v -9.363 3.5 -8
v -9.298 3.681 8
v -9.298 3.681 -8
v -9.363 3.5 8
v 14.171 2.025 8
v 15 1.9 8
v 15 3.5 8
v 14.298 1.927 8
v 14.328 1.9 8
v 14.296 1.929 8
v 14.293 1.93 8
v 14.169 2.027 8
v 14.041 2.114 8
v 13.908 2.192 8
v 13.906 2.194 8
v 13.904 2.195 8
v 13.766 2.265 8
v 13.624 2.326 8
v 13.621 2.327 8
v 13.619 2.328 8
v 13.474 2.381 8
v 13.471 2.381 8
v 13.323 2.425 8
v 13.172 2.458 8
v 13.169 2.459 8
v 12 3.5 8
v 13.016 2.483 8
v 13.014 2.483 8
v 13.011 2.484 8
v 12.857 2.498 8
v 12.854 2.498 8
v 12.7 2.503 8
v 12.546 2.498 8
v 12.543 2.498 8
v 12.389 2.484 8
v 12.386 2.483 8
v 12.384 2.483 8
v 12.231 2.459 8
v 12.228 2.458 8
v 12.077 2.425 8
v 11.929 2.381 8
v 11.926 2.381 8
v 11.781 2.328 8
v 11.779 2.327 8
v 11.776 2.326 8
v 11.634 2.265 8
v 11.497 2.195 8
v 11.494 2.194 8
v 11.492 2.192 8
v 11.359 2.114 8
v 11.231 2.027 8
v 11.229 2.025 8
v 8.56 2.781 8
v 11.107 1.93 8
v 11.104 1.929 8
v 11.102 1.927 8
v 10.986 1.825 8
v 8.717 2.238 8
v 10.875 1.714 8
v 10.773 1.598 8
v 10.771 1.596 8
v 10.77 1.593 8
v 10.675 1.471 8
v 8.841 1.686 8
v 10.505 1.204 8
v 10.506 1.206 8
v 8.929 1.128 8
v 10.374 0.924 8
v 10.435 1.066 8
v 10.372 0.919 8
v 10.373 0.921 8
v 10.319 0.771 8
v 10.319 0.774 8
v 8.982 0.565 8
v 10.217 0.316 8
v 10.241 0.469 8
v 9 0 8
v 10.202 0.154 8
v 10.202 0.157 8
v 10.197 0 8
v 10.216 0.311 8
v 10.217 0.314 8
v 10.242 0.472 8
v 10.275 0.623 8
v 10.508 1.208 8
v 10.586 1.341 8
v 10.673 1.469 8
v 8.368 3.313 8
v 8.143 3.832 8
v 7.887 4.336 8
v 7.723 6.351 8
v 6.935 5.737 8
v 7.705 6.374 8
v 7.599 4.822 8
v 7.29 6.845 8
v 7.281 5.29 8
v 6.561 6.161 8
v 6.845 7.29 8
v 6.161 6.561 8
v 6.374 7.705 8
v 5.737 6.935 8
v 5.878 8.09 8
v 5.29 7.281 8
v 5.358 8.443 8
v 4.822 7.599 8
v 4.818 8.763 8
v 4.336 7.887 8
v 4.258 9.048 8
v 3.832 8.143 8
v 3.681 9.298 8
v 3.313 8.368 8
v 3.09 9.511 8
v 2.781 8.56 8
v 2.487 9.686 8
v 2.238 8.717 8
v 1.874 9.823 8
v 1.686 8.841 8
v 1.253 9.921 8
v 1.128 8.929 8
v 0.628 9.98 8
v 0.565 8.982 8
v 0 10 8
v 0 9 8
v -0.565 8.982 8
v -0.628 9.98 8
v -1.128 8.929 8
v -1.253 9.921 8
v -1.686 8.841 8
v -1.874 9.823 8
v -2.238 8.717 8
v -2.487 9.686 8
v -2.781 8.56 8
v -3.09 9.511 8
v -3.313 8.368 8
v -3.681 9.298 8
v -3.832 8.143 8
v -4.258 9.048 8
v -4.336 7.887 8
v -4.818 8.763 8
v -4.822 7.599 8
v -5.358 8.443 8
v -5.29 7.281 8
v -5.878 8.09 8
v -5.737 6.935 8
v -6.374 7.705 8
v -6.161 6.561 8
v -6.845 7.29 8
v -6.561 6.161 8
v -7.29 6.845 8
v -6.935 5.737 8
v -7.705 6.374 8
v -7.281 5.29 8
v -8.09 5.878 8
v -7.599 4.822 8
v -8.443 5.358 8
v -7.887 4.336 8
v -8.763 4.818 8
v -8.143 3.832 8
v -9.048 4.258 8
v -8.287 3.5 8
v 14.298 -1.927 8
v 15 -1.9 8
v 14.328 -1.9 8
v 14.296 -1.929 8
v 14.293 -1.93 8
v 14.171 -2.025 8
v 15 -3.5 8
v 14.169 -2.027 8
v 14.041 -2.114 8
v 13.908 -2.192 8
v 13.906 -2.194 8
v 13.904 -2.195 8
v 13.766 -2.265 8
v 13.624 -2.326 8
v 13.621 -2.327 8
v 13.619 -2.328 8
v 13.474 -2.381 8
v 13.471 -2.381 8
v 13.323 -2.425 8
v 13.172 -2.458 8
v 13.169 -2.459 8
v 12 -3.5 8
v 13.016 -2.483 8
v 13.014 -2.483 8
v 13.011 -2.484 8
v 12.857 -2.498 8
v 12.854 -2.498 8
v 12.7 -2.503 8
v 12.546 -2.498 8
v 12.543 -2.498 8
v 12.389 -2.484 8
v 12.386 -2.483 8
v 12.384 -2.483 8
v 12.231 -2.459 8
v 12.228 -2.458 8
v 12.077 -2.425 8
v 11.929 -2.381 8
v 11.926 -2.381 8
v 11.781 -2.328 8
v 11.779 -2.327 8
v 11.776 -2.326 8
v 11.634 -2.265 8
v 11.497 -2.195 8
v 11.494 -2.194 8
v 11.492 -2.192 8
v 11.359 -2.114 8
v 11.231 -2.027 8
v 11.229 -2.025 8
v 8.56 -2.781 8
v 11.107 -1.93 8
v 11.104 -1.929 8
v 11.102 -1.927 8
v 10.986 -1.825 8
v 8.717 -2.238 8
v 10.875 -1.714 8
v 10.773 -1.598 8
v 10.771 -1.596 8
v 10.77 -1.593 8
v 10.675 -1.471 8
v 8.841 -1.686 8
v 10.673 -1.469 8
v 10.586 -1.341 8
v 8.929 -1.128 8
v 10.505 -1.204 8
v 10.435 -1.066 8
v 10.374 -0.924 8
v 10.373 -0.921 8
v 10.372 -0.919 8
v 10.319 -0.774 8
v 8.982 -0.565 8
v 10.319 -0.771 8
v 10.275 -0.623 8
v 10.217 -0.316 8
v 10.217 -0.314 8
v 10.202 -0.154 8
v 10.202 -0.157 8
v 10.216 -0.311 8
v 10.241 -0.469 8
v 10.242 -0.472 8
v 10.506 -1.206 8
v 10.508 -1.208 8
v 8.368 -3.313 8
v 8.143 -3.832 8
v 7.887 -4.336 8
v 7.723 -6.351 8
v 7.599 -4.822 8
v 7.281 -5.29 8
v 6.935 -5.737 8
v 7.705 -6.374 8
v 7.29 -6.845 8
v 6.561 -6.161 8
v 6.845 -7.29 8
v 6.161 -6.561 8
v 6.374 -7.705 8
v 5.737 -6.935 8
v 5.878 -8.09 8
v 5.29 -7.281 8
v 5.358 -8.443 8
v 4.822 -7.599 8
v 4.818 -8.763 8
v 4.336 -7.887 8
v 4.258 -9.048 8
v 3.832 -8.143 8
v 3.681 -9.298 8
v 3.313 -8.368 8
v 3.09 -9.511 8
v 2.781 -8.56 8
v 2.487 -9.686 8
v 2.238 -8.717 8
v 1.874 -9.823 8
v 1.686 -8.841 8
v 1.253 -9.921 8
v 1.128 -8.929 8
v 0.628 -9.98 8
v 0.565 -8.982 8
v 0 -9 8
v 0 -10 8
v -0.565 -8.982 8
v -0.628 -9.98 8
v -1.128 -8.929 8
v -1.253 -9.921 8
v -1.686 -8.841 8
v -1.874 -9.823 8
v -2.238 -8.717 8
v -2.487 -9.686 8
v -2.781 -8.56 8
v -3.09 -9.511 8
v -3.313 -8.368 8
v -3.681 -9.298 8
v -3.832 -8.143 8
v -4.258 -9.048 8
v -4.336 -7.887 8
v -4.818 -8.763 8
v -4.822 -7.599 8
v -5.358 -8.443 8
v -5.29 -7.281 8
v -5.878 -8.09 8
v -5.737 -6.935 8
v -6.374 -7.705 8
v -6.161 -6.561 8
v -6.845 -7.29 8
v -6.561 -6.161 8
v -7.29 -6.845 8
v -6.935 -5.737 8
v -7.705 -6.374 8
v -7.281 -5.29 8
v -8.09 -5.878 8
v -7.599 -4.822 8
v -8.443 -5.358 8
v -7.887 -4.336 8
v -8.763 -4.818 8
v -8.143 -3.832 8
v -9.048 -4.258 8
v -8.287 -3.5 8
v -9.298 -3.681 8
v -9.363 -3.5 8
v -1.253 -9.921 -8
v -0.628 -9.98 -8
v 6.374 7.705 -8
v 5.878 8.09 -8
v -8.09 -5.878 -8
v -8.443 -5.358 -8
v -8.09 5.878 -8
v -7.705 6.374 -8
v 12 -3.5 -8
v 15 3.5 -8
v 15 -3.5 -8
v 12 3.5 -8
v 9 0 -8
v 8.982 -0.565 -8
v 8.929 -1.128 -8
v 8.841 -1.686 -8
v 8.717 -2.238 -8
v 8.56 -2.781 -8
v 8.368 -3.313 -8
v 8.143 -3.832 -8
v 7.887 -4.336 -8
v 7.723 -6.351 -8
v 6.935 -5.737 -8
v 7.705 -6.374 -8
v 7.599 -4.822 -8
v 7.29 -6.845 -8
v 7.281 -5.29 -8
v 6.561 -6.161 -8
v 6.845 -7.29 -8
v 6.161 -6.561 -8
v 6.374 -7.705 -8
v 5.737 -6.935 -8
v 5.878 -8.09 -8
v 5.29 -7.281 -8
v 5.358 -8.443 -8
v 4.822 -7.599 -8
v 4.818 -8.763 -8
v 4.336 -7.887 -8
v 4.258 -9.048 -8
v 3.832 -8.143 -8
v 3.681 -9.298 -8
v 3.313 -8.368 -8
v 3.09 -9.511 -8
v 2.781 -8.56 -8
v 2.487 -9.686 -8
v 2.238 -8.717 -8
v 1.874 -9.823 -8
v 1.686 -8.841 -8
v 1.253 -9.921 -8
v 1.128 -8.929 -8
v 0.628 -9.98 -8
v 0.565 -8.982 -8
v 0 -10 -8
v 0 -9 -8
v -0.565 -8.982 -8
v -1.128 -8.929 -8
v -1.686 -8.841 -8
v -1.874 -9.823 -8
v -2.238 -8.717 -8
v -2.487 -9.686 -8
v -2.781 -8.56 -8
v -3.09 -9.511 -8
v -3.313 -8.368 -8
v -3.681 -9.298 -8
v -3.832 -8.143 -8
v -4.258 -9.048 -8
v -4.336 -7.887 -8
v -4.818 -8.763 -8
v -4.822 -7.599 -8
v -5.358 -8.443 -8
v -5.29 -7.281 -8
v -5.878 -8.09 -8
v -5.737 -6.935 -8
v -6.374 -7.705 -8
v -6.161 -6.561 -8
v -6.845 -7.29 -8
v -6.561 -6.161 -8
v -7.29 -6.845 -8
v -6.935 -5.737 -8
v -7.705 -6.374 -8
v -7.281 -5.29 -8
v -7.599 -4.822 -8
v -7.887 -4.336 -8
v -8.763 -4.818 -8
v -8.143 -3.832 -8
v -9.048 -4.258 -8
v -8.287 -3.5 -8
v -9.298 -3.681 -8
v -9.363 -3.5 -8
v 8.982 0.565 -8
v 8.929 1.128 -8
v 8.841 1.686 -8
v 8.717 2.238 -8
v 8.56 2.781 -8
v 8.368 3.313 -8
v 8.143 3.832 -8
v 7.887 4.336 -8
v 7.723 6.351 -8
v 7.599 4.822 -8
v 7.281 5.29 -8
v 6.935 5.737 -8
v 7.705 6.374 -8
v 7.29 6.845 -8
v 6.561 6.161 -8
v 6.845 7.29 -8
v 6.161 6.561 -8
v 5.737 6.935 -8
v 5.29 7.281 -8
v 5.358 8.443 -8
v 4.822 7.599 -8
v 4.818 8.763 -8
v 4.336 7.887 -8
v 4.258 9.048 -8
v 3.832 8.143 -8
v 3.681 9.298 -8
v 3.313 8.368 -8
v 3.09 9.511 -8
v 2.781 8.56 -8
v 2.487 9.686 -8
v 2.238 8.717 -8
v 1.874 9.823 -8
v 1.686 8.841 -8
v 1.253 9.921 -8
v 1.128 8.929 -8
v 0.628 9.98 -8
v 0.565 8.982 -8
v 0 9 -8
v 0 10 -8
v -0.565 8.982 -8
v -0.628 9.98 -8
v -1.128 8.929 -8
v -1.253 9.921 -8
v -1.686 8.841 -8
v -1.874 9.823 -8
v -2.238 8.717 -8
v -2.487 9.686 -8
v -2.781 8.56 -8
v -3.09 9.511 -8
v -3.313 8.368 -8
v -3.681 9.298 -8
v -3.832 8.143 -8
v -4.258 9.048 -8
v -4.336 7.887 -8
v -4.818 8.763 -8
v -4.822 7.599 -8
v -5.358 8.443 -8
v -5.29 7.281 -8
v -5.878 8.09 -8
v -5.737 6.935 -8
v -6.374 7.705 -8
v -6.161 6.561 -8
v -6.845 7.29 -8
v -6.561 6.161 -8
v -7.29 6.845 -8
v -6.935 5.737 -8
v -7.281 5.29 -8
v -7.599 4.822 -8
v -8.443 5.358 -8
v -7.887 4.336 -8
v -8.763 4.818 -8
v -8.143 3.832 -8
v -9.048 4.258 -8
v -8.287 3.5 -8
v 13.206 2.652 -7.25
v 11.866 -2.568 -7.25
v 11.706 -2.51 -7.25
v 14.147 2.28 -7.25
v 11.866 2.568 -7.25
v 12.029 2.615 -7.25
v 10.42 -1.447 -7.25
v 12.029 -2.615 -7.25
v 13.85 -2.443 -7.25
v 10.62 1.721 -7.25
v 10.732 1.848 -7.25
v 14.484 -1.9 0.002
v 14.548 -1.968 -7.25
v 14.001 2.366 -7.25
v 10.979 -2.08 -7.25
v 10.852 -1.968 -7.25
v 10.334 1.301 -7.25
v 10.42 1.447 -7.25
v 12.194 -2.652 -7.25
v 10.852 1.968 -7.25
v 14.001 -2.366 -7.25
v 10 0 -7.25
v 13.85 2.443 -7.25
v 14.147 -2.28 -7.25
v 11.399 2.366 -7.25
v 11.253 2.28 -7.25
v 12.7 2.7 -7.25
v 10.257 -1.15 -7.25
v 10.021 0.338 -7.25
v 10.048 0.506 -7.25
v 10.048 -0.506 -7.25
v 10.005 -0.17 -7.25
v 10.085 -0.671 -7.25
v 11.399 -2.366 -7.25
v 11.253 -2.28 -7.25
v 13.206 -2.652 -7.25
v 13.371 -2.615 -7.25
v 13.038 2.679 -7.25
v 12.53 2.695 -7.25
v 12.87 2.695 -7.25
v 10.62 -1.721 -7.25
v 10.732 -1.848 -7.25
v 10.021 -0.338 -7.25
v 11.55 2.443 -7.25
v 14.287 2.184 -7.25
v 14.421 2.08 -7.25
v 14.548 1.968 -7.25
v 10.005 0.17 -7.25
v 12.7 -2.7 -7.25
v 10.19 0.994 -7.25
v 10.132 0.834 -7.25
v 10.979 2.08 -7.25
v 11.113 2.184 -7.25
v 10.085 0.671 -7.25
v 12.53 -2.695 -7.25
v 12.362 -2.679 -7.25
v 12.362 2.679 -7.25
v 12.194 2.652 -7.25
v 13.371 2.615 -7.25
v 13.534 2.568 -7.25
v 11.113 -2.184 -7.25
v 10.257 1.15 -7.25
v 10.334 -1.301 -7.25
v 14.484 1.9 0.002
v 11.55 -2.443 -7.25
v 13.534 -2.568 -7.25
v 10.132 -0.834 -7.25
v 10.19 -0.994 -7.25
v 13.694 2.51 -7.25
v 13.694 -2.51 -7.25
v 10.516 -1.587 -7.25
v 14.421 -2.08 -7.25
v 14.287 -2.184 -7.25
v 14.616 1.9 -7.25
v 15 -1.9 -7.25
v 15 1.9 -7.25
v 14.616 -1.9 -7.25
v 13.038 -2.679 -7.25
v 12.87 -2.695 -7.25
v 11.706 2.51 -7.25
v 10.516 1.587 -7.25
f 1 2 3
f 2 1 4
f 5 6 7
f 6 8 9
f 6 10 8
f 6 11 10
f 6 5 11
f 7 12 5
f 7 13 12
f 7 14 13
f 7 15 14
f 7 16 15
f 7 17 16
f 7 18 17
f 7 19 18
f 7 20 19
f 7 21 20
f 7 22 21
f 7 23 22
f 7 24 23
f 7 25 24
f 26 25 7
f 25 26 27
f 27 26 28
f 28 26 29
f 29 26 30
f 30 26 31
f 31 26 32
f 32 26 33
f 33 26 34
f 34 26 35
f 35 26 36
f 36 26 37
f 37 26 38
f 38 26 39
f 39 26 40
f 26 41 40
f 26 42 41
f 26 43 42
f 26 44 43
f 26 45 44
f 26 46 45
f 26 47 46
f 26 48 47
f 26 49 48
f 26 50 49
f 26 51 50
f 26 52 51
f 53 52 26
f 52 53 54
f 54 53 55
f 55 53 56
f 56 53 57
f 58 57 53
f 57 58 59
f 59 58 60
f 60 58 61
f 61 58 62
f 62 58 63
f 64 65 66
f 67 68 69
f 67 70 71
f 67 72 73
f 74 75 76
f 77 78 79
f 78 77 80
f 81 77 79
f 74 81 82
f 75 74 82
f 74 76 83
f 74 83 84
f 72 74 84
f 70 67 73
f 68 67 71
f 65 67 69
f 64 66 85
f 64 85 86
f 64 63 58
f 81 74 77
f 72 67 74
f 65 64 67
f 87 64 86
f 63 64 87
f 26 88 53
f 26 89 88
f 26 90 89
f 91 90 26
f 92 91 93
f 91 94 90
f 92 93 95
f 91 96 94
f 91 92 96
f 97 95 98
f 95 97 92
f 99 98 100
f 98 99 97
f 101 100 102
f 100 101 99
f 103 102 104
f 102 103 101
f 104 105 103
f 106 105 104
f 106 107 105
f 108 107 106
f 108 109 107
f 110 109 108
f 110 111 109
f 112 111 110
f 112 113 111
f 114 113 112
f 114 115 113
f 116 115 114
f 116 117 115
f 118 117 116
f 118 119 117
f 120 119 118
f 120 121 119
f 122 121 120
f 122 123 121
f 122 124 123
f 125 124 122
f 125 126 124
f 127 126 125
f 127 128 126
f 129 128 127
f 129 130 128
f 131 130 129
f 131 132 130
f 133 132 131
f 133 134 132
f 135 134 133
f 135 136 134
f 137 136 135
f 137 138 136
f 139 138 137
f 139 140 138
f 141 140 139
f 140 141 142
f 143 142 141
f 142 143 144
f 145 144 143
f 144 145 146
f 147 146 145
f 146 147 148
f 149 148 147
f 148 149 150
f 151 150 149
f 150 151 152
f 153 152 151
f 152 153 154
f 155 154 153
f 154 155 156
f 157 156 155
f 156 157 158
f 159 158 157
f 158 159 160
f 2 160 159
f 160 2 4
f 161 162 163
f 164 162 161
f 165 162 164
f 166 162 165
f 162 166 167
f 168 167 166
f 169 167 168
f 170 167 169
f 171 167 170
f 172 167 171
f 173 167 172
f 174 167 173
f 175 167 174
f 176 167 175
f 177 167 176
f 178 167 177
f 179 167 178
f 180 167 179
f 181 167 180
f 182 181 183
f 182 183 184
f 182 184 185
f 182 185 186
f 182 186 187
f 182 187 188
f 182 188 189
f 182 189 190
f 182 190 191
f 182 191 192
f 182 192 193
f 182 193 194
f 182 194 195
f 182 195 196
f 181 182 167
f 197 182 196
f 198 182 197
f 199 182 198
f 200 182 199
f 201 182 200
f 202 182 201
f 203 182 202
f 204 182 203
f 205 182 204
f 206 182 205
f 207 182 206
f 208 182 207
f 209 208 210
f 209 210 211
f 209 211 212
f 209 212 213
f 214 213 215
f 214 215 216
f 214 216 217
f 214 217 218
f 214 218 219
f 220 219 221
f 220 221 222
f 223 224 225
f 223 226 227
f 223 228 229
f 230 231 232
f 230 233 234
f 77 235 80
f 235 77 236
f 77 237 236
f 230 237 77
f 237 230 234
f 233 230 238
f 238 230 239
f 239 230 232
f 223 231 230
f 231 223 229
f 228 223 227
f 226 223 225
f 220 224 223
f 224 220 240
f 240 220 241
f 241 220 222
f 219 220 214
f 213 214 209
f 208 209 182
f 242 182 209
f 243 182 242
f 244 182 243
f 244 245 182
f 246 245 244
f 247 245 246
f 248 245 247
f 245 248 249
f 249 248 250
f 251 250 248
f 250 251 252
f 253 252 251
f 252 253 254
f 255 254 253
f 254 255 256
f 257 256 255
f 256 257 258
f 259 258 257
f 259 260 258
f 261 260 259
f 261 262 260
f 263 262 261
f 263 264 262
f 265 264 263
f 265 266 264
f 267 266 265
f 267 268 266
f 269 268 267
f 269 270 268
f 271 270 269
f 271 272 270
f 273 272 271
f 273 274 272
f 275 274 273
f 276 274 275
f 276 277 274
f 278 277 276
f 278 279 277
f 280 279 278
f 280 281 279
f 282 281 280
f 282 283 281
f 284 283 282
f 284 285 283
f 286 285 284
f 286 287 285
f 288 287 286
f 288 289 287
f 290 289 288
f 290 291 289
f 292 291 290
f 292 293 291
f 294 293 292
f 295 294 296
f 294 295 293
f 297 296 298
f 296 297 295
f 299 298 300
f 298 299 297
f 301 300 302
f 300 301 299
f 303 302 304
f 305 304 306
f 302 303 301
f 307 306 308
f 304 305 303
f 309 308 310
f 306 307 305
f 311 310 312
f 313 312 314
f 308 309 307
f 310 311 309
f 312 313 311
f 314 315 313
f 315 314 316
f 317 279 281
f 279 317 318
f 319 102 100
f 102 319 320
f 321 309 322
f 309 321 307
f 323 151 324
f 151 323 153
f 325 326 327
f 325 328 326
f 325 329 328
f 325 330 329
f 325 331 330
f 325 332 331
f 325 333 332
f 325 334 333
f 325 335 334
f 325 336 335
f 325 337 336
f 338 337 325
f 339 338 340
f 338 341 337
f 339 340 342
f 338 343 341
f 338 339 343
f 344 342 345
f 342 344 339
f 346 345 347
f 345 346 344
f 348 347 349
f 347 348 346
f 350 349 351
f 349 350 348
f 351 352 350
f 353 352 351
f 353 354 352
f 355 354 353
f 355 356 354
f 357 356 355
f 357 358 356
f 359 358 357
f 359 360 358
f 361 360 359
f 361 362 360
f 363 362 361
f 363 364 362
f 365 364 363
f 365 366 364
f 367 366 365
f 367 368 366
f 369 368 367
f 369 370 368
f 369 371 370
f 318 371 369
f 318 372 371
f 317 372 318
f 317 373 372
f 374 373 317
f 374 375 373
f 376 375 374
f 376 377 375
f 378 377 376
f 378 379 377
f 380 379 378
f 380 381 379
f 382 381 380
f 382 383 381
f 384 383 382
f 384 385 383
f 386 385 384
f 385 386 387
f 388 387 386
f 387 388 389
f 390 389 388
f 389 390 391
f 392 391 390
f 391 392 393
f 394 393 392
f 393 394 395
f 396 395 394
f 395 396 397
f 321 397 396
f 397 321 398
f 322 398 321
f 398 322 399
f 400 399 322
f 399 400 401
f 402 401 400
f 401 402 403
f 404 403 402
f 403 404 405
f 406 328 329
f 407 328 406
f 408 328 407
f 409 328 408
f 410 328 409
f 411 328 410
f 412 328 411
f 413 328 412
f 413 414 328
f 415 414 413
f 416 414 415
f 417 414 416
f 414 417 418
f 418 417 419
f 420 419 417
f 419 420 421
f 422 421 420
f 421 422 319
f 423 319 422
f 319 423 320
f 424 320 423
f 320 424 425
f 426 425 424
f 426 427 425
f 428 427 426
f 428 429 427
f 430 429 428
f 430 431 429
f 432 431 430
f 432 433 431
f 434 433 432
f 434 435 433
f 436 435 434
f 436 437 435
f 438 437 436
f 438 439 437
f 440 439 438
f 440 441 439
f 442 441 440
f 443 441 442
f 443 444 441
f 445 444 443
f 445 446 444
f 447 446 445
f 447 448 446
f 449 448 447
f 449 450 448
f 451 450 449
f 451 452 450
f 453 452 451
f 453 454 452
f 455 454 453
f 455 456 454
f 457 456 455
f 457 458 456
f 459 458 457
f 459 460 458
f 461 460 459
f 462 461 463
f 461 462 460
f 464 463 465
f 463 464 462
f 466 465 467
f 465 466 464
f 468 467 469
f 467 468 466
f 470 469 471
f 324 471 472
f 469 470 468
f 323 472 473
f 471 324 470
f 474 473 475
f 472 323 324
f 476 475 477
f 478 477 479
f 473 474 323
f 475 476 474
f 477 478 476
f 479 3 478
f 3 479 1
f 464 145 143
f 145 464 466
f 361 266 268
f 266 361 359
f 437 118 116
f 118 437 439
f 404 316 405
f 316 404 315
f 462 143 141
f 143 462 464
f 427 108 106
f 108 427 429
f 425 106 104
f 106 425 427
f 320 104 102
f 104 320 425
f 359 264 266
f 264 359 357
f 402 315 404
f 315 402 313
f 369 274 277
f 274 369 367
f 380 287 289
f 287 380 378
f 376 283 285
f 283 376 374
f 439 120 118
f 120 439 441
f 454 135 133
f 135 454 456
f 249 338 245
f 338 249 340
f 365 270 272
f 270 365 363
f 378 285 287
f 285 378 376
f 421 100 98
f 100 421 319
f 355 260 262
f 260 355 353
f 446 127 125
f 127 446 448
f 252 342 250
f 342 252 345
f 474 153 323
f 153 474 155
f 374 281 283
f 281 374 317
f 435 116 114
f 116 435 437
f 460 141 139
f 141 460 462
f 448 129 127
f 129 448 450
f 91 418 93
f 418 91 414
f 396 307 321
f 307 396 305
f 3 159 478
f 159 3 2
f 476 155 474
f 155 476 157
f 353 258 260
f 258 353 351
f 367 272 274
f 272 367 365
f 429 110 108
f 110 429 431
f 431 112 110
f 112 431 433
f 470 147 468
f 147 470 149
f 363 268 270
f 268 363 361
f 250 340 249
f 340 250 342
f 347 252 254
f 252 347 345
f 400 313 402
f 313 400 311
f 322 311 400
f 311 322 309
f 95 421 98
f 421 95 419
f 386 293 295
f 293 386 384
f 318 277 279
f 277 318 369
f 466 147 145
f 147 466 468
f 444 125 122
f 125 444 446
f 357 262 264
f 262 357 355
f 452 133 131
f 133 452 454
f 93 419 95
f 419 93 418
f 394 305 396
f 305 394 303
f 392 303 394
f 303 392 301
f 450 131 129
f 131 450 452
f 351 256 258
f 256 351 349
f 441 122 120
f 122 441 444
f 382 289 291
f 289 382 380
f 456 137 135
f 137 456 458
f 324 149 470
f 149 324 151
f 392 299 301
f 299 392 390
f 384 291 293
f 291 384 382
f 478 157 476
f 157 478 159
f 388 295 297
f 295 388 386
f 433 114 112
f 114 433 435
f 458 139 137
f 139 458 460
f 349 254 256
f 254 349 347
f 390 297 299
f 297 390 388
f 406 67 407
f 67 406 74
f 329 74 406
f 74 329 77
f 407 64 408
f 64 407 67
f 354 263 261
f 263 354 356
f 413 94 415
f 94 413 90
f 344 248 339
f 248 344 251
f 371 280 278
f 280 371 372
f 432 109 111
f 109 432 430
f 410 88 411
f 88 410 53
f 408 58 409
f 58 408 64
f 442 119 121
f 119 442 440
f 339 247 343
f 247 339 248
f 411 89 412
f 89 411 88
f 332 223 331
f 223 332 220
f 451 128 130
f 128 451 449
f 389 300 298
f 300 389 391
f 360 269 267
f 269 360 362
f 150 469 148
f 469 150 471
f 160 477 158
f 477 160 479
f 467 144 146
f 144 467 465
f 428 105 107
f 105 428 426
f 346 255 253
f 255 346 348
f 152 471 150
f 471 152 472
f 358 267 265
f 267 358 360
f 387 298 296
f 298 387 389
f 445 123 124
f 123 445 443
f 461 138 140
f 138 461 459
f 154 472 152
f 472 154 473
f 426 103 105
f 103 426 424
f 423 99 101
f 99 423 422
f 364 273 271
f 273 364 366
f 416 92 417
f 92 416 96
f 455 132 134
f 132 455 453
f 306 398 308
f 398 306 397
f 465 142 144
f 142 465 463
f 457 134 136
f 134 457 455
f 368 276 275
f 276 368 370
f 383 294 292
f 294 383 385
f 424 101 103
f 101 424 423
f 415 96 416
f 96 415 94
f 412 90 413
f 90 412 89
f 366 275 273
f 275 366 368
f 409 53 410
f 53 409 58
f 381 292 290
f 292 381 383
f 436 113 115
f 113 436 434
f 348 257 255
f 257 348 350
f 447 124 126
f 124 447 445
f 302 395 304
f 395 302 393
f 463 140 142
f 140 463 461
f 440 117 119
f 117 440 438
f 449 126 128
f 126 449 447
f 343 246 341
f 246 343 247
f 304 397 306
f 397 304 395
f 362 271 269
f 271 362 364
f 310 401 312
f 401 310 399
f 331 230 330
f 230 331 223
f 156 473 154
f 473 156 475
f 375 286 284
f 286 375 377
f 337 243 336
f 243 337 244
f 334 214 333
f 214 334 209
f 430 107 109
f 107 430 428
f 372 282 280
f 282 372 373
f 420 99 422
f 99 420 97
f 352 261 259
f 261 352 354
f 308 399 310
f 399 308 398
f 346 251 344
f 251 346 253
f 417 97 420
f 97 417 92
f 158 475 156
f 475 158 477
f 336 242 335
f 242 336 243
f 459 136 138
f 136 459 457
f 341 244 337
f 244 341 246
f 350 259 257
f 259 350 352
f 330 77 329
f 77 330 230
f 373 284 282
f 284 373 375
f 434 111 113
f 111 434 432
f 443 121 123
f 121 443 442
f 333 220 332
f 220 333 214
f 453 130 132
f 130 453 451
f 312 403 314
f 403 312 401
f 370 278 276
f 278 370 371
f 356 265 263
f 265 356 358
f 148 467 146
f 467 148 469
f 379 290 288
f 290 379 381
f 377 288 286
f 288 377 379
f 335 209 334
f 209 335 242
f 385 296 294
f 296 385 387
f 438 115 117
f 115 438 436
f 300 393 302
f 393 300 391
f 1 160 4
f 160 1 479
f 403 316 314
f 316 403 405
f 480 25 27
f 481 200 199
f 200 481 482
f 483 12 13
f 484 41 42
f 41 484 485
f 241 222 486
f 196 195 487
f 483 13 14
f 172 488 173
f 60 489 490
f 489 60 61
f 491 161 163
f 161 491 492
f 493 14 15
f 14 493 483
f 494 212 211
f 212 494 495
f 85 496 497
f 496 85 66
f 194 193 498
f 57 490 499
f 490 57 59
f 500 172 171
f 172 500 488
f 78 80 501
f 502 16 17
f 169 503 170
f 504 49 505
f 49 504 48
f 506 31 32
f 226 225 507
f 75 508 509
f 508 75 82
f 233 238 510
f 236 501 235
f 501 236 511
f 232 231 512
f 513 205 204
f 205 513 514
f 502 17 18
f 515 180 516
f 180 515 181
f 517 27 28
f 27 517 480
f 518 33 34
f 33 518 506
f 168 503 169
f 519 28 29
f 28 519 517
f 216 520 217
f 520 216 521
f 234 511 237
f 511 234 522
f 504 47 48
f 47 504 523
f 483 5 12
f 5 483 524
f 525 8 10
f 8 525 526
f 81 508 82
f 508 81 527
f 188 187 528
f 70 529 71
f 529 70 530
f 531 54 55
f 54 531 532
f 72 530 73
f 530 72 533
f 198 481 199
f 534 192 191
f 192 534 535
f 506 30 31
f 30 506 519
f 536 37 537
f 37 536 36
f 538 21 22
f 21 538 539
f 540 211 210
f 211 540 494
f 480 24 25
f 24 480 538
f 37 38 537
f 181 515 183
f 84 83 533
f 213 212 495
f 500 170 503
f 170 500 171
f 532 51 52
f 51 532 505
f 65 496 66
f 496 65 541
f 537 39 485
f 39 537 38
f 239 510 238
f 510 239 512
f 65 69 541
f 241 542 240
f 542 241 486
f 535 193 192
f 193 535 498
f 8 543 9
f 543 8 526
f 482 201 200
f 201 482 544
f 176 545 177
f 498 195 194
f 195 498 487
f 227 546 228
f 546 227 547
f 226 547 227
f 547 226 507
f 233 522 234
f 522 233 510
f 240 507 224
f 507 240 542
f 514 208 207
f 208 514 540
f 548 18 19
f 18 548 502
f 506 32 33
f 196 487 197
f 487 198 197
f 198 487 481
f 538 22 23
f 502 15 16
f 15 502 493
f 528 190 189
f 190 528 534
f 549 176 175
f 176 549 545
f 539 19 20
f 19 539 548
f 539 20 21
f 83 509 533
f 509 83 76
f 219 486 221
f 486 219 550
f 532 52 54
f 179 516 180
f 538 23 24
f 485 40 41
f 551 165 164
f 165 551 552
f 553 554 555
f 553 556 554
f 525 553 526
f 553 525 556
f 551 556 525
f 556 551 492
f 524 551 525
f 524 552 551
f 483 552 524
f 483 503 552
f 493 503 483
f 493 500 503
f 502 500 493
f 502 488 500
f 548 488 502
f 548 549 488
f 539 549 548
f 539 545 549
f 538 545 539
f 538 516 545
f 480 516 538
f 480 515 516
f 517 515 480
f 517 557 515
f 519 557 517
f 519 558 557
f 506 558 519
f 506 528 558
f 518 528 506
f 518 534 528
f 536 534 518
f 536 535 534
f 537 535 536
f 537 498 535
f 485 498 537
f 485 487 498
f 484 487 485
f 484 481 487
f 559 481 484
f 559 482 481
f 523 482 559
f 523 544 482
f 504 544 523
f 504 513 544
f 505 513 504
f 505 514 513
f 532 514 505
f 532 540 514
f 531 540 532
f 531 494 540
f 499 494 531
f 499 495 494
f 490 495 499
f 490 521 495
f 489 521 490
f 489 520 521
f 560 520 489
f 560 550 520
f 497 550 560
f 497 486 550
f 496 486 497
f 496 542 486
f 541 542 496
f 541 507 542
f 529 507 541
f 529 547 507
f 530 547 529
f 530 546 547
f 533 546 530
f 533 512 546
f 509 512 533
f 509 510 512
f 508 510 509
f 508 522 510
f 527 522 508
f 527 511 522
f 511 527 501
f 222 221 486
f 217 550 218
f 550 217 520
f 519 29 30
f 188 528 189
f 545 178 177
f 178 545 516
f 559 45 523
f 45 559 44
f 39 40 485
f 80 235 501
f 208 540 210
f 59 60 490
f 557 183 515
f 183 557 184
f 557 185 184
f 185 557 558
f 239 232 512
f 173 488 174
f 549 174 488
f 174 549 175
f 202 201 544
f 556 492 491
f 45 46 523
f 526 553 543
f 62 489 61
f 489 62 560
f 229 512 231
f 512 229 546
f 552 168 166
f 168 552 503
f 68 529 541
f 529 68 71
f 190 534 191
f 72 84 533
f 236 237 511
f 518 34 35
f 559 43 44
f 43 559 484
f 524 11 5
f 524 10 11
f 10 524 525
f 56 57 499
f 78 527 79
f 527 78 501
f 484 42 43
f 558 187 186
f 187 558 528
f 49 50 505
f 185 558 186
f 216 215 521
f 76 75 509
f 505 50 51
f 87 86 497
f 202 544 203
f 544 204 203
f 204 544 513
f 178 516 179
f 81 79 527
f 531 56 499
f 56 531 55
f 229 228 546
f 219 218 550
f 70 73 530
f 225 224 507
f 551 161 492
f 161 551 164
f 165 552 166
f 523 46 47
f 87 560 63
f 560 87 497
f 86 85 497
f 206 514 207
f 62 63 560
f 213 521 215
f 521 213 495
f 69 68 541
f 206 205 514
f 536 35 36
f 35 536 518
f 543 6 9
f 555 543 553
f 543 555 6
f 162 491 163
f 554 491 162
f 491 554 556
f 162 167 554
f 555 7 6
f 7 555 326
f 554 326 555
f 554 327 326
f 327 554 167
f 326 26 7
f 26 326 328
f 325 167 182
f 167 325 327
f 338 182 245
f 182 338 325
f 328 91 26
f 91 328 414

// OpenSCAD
$fn=100;
module ring(heigth,radius){
	// the ring itself
	radius = radius+1;
	difference(){
		cylinder(h=heigth,r=radius+1,center=true);
		cylinder(h=heigth+1,r=radius,center=true);
		// the hole...
   		rotate([0,0,0]) translate([-radius,0,0]) cube([3,7,heigth+2],center=true);
	}

	// the magnet holder
	rMag = 2.5;
	translate([radius+rMag+0.5,0,0])
	difference(){
		cube([rMag*2+1,rMag*2+2,heigth],center=true);
		translate([0.7,0,0.5]) 
		union(){						
			cylinder(h=heigth-0.5,r1=rMag+0.2,r2=rMag,center=true);	//inner cylinder
			translate([rMag,0,0]) cube([3,3.8,heigth-0.5],center=true);	//upper hole
		}
	}
	// the connection/stabilization thing
	// for radius = 7.5
	translate([radius,-(rMag*2+2)/2,0])		
	linear_extrude(height = heigth, center = true, convexity = 10, twist = 0)
	polygon(points=[[0,0],[-3,-4],[(rMag*2+1)/2,0]], paths=[[0,1,2]]);
	mirror([0,1,0])
	translate([radius,-(rMag*2+2)/2,0])
	linear_extrude(height = heigth, center = true, convexity = 10, twist = 0)
	polygon(points=[[0,0],[-3,-4],[(rMag*2+1)/2,0]], paths=[[0,1,2]]);
}


/* radi for (my)fingers:
	index: 7.5
	middle: 8 
	ring: 7.5
	pinky: 6

	wooden hand:
	index: 7.5
	middle: 7.5 
	ring: 7.5
	pinky: 7	


	dimensions of magnet: 
	radius = 2.5
	length = 15
*/

ring(16,8);
//translate([0,0,20])
//cylinder(h=16-0.5,r1=2.5+0.2,r2=2.5-0.1,center=true);
